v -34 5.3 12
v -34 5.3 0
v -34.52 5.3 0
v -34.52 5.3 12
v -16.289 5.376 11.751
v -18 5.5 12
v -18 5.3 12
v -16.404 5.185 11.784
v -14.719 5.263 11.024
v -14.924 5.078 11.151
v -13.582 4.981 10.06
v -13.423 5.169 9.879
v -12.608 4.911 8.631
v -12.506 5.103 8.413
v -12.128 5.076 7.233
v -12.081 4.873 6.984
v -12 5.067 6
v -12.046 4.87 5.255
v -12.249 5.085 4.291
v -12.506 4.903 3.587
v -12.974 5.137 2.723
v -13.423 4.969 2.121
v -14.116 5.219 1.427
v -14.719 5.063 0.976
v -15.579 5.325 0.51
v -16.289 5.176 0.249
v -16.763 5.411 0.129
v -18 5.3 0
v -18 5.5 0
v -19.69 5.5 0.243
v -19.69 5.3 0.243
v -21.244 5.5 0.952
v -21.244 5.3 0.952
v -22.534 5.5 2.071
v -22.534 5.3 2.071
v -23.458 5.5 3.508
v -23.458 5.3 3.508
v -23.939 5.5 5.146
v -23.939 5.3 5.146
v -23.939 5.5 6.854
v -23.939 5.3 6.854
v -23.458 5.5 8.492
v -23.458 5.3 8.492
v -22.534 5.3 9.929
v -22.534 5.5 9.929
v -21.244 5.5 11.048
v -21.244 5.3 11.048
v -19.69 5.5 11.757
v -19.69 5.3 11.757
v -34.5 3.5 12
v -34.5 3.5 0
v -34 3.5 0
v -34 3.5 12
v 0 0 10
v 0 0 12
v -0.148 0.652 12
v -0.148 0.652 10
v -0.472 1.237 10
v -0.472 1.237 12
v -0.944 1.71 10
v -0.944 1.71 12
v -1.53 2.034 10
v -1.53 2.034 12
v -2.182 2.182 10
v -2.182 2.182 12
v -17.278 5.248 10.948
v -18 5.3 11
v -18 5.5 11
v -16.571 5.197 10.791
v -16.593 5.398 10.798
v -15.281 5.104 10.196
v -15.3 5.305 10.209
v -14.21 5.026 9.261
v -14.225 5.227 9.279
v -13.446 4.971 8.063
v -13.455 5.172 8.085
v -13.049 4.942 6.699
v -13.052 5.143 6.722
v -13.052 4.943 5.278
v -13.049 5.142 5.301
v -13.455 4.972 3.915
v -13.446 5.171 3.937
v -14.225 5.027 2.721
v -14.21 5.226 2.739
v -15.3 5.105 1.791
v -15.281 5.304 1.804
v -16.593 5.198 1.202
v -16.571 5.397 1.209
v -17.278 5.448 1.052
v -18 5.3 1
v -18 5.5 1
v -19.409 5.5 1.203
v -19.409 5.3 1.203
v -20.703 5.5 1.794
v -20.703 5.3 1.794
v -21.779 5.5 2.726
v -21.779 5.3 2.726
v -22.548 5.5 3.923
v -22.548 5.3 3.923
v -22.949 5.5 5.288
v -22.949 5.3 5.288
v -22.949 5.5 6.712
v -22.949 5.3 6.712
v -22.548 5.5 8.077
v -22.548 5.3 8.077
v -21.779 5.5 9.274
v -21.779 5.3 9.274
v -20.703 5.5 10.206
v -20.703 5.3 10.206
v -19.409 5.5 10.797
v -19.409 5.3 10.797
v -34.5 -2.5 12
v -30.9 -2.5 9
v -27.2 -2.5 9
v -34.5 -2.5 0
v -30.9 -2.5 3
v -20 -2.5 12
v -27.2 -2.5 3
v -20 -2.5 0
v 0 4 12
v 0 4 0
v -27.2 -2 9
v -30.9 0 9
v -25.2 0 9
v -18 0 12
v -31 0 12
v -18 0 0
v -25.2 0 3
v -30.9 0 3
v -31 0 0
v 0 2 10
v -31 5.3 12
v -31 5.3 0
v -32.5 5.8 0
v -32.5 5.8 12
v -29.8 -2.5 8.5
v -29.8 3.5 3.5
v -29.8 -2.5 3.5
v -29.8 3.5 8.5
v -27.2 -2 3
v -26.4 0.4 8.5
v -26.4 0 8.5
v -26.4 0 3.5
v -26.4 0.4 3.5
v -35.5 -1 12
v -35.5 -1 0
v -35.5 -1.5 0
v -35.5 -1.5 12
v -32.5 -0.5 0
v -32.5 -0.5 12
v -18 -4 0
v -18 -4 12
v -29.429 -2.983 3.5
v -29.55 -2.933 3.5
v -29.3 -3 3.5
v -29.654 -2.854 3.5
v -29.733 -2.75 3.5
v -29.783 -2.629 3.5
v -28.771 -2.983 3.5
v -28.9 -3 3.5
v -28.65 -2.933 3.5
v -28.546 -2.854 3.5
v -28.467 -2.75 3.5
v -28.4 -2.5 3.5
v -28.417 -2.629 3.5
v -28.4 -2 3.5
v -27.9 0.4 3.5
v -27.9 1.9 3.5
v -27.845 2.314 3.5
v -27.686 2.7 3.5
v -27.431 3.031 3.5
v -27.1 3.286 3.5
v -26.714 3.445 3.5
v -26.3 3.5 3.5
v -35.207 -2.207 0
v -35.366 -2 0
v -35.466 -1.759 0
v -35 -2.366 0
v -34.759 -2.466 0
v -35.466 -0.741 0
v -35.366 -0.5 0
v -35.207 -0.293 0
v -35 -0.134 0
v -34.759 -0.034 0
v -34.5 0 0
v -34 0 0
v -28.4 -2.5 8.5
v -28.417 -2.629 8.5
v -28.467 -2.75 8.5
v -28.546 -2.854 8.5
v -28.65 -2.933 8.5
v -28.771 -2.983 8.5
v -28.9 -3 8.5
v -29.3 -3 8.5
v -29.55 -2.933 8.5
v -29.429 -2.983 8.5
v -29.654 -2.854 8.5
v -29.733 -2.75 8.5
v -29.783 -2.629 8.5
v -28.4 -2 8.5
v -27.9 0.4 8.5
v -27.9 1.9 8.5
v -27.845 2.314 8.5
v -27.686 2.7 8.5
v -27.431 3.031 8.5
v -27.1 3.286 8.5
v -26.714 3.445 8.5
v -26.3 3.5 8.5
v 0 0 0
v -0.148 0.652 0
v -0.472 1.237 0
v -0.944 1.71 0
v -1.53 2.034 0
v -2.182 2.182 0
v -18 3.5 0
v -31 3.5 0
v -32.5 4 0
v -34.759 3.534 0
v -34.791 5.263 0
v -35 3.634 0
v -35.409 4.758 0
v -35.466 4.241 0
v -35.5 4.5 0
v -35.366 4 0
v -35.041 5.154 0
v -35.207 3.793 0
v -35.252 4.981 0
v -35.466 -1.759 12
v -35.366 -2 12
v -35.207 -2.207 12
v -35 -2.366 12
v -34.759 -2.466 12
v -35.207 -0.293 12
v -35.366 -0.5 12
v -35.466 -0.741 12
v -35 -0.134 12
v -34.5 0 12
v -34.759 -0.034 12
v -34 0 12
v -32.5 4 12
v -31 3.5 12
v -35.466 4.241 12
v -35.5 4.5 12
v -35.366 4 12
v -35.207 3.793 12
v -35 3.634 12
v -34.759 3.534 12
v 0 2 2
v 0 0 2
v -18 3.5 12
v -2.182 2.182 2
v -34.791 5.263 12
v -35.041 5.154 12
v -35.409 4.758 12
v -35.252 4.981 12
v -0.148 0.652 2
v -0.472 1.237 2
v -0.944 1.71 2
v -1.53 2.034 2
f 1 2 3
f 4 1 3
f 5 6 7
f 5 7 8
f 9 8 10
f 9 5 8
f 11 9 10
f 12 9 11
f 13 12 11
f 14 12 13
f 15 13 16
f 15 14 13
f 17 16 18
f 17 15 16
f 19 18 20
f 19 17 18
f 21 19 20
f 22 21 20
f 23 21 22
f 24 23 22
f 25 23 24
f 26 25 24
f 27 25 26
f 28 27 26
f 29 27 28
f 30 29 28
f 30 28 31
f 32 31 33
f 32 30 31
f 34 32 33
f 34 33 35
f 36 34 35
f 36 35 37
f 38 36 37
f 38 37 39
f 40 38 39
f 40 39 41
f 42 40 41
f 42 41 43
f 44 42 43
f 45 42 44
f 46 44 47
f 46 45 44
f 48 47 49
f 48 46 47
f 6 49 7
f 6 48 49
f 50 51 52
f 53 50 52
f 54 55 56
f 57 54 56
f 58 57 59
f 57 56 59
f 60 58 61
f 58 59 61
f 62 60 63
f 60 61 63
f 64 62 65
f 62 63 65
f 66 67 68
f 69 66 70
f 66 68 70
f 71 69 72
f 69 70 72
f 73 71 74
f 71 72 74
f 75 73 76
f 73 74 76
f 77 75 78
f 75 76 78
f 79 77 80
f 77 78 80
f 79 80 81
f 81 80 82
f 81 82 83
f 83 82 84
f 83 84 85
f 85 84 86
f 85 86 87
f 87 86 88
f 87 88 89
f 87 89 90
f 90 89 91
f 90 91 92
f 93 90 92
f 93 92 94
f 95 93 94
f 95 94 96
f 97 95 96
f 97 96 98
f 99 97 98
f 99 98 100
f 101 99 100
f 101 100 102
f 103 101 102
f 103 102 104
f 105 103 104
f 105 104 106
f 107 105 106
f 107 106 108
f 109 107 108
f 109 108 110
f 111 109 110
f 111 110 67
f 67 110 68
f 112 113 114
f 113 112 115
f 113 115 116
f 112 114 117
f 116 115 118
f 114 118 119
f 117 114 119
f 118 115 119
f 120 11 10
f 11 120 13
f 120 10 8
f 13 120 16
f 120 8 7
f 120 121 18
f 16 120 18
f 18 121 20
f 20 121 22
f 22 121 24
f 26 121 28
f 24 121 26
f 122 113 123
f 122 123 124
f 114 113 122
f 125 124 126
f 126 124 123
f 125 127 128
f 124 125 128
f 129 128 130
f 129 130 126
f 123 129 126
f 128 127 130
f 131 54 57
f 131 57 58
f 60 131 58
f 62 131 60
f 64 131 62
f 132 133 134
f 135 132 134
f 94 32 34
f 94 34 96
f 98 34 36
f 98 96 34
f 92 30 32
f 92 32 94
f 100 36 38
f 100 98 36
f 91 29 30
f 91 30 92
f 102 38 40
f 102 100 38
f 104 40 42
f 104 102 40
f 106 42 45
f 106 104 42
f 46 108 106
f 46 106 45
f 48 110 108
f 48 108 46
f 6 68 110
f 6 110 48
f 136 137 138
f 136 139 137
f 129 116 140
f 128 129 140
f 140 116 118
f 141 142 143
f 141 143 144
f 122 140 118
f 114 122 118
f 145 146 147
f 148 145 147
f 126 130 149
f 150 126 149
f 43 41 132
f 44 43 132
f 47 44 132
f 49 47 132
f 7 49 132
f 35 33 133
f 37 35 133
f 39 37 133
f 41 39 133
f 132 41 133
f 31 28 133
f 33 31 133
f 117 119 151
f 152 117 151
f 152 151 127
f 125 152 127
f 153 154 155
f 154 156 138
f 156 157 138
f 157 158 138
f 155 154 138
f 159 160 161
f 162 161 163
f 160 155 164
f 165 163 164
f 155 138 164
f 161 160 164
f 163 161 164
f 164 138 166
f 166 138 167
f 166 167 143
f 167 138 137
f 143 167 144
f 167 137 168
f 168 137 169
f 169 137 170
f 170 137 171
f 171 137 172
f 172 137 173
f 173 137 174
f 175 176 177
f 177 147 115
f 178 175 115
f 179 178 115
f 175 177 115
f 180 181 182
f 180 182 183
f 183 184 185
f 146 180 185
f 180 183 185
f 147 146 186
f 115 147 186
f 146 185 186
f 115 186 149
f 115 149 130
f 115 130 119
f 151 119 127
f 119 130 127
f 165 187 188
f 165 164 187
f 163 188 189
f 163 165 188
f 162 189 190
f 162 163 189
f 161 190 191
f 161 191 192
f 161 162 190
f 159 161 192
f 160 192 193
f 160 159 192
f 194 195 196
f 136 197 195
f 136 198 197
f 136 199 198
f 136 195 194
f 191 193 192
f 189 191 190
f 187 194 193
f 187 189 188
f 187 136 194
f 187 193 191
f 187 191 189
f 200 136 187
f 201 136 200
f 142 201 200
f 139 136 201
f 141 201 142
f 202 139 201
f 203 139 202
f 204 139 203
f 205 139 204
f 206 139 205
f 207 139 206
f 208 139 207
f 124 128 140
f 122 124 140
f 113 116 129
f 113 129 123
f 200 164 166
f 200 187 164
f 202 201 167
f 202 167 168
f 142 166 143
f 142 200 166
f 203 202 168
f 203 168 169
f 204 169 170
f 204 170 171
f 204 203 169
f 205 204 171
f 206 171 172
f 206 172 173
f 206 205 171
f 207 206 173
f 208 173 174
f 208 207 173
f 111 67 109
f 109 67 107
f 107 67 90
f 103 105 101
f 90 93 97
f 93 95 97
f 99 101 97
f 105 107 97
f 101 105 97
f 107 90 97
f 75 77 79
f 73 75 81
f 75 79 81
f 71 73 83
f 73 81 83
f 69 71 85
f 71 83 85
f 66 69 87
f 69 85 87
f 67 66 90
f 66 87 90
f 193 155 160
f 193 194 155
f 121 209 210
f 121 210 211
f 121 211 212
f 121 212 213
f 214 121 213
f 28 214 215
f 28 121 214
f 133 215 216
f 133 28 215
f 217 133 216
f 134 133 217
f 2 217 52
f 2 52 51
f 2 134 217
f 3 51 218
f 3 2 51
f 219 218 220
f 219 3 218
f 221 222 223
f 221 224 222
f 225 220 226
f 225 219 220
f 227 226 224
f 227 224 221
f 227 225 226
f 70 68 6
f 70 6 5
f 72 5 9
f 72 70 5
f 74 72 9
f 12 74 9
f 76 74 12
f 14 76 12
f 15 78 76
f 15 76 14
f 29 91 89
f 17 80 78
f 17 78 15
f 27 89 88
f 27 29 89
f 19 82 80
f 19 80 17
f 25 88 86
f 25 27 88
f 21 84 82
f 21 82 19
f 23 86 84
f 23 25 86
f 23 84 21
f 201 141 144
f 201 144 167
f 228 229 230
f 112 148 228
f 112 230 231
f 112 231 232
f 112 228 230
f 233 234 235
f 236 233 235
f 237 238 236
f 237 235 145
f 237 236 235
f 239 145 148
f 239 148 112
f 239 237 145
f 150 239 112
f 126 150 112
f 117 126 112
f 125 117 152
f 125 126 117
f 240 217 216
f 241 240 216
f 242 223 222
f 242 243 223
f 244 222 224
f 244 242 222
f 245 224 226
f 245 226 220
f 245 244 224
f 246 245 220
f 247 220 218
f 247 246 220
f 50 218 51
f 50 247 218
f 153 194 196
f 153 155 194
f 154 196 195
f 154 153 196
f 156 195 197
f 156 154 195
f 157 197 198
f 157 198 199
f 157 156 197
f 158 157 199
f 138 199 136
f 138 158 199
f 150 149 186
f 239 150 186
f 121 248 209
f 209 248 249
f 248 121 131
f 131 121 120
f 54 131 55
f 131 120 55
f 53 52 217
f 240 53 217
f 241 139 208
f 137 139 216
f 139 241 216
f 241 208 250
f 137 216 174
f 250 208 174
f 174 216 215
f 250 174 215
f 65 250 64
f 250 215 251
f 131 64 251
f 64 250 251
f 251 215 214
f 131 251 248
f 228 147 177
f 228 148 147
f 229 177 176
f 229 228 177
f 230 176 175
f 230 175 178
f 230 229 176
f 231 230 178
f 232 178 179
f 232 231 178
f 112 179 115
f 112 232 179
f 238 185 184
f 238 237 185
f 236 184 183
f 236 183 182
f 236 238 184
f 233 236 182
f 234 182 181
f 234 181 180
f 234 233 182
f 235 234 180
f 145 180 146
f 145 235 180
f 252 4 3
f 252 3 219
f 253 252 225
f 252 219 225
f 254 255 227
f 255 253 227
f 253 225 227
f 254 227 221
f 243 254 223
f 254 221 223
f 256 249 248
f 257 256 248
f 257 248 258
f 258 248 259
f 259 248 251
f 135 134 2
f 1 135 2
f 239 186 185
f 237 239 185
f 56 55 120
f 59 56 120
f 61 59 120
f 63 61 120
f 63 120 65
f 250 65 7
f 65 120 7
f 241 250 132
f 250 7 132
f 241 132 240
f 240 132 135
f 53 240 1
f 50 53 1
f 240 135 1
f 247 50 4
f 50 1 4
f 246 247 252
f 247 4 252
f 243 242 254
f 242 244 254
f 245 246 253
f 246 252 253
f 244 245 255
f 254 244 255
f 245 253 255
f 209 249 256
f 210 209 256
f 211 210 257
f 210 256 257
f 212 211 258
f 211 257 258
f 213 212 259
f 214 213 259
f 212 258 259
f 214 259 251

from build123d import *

# Parameters (mm, degrees)
BOSS_EXTRUDE1_DEPTH   = 12
BOSS_EXTRUDE1_2_DEPTH = 12
SKETCH2_W             = 5.7
SKETCH2_H             = 6
CUT_EXTRUDE1_DEPTH    = 3
BOSS_EXTRUDE2_DEPTH   = 6
BOSS_EXTRUDE3_START   = -6
BOSS_EXTRUDE3_DEPTH   = 2.5
FILLET7_R             = 1
FILLET8_R             = 1
FILLET10_R            = 1
FILLET11_R            = 1
BOSS_EXTRUDE4_DEPTH   = 2
BOSS_EXTRUDE5_START   = -10
BOSS_EXTRUDE5_DEPTH   = 2
FILLET12_R            = 0.5
BOSS_EXTRUDE7_REACH   = 45.42
BOSS_EXTRUDE7_START   = 5.5
SKETCH6_R             = 6
SKETCH6_R_2           = 5
CUT_EXTRUDE3_DEPTH    = 38.919520039


with BuildPart() as part:
    # Sketch1 → Boss-Extrude1 (new body)
    with BuildSketch(Plane.XY):
        Polygon((0, 4), (-18, 5.3), (-31, 5.3), (-32.5, 5.8), (-34, 5.3), (-35.5, 5.3), (-35.5, 3.5), (-34, 3.5), (-32.5, 4), (-31, 3.5), (-18, 3.5), (0, 2), align=None)
    extrude(amount=BOSS_EXTRUDE1_DEPTH)

    # Sketch4 → Boss-Extrude3 (add, symmetric)
    with BuildSketch(Plane.XY.offset(12).offset(BOSS_EXTRUDE3_START)):
        with BuildLine():
            Line((-28.4, -2), (-26.4, 0))
            Line((-26.4, 0), (-26.4, 0.4))
            Line((-26.4, 0.4), (-27.9, 0.4))
            Line((-27.9, 0.4), (-27.9, 1.9))
            ThreePointArc((-27.9, 1.9), (-27.43137085, 3.03137085), (-26.3, 3.5))
            Line((-26.3, 3.5), (-29.8, 3.5))
            Line((-29.8, 3.5), (-29.8, -3))
            Line((-29.8, -3), (-28.4, -3))
            Line((-28.4, -3), (-28.4, -2))
        make_face()
    extrude(amount=BOSS_EXTRUDE3_DEPTH, both=True)

    # Fillet8
    fillet8_edges = [part.edges().sort_by_distance(p)[0] for p in [
        (-35.5, 3.5, 6),
    ]]
    fillet(fillet8_edges, radius=FILLET8_R)

    # Fillet10
    # the kernel refuses this fillet: 1 mm, written as the material it takes off along each edge
    with BuildSketch(Plane(origin=(-35.5, 5.3, -2.449489743), x_dir=(1.545430450277731e-12, -1.0, 0), z_dir=(0, 0, 1))) as fillet10_piece_1:
        with BuildLine():
            CenterArc((1, 0.979795897), FILLET10_R, 180, 78.463040967)
            Line((0, 0.979795897), (-0.02, 0.979795897))
            Line((-0.02, 0.979795897), (-0.02, 0))
            Line((-0.02, 0), (0, -0.02))
            ThreePointArc((0, -0.02), (0.4, -0.02), (0.796, -0.019595918))
            Line((0.796, -0.019595918), (0.8, 0))
        make_face()
    extrude(amount=16.898979486, mode=Mode.SUBTRACT)

    # Sketch5 → Boss-Extrude4 (add)
    with BuildSketch(Plane.XY.offset(12)):
        with BuildLine():
            Line((0, 2), (0, 0))
            ThreePointArc((0, 0), (-0.691300526, 1.490517656), (-2.181818182, 2.181818182))
            Line((-2.181818182, 2.181818182), (0, 2))
        make_face()
    extrude(amount=-BOSS_EXTRUDE4_DEPTH)

    # Sketch5<2> → Boss-Extrude5 (add)
    with BuildSketch(Plane.XY.offset(12).offset(BOSS_EXTRUDE5_START)):
        with BuildLine():
            Line((0, 2), (0, 0))
            ThreePointArc((0, 0), (-0.691300526, 1.490517656), (-2.181818182, 2.181818182))
            Line((-2.181818182, 2.181818182), (0, 2))
        make_face()
    extrude(amount=-BOSS_EXTRUDE5_DEPTH)

    # Fillet12
    fillet12_edges = [part.edges().sort_by_distance(p)[0] for p in [
        (-28.4, -3, 6),
        (-29.8, -3, 6),
    ]]
    fillet(fillet12_edges, radius=FILLET12_R)

    # Sketch6 → Boss-Extrude7 (add, up to next)
    with BuildSketch(Plane(origin=(0, 0, 0), x_dir=(1, 0, 0), z_dir=(0, 1, 0)).offset(BOSS_EXTRUDE7_START), mode=Mode.PRIVATE) as boss_extrude7_sk1:
        with Locations(Location((-18, -6, 0), (0, 0, 270))):
            Circle(SKETCH6_R)
        with Locations(Location((-18, -6, 0), (0, 0, 270))):
            Circle(SKETCH6_R_2, mode=Mode.SUBTRACT)
    boss_extrude7_tool1 = extrude(boss_extrude7_sk1.sketch, amount=-BOSS_EXTRUDE7_REACH, mode=Mode.PRIVATE) - part.part
    add(boss_extrude7_tool1.solids().sort_by_distance((-18, 5.5, 0.169706))[0])

    # Sketch7 → Cut-Extrude3 (cut, through all)
    with BuildSketch(Plane.XY):
        Polygon((-18, 5.5), (-12, 5.066666667), (-12, 5.5), align=None)
    extrude(amount=CUT_EXTRUDE3_DEPTH, mode=Mode.SUBTRACT)


with BuildPart() as body_2:
    # Sketch1 → Boss-Extrude1 2 (new body)
    with BuildSketch(Plane.XY):
        Polygon((-35.5, -2.5), (-20, -2.5), (-18, -4), (-18, 0), (-31, 0), (-32.5, -0.5), (-34, 0), (-35.5, 0), align=None)
    extrude(amount=BOSS_EXTRUDE1_2_DEPTH)

    # Sketch2 → Cut-Extrude1 (cut)
    with BuildSketch(Plane.XZ.offset(2.5)):
        with Locations((-28.05, 6)):
            Rectangle(SKETCH2_W, SKETCH2_H)
    extrude(amount=-CUT_EXTRUDE1_DEPTH, mode=Mode.SUBTRACT)

    # Sketch3 → Boss-Extrude2 (add)
    with BuildSketch(Plane.XY.offset(3)):
        Polygon((-25.2, 0), (-27.2, -2), (-27.2, -2.5), (-25.2, -2.5), align=None)
    extrude(amount=BOSS_EXTRUDE2_DEPTH)

    # Fillet7
    fillet7_edges = [body_2.edges().sort_by_distance(p)[0] for p in [
        (-35.5, 0, 6),
    ]]
    fillet(fillet7_edges, radius=FILLET7_R)

    # Fillet11
    fillet11_edges = [body_2.edges().sort_by_distance(p)[0] for p in [
        (-35.5, -2.5, 6),
    ]]
    fillet(fillet11_edges, radius=FILLET11_R)


solid = Compound([part.part, body_2.part])
